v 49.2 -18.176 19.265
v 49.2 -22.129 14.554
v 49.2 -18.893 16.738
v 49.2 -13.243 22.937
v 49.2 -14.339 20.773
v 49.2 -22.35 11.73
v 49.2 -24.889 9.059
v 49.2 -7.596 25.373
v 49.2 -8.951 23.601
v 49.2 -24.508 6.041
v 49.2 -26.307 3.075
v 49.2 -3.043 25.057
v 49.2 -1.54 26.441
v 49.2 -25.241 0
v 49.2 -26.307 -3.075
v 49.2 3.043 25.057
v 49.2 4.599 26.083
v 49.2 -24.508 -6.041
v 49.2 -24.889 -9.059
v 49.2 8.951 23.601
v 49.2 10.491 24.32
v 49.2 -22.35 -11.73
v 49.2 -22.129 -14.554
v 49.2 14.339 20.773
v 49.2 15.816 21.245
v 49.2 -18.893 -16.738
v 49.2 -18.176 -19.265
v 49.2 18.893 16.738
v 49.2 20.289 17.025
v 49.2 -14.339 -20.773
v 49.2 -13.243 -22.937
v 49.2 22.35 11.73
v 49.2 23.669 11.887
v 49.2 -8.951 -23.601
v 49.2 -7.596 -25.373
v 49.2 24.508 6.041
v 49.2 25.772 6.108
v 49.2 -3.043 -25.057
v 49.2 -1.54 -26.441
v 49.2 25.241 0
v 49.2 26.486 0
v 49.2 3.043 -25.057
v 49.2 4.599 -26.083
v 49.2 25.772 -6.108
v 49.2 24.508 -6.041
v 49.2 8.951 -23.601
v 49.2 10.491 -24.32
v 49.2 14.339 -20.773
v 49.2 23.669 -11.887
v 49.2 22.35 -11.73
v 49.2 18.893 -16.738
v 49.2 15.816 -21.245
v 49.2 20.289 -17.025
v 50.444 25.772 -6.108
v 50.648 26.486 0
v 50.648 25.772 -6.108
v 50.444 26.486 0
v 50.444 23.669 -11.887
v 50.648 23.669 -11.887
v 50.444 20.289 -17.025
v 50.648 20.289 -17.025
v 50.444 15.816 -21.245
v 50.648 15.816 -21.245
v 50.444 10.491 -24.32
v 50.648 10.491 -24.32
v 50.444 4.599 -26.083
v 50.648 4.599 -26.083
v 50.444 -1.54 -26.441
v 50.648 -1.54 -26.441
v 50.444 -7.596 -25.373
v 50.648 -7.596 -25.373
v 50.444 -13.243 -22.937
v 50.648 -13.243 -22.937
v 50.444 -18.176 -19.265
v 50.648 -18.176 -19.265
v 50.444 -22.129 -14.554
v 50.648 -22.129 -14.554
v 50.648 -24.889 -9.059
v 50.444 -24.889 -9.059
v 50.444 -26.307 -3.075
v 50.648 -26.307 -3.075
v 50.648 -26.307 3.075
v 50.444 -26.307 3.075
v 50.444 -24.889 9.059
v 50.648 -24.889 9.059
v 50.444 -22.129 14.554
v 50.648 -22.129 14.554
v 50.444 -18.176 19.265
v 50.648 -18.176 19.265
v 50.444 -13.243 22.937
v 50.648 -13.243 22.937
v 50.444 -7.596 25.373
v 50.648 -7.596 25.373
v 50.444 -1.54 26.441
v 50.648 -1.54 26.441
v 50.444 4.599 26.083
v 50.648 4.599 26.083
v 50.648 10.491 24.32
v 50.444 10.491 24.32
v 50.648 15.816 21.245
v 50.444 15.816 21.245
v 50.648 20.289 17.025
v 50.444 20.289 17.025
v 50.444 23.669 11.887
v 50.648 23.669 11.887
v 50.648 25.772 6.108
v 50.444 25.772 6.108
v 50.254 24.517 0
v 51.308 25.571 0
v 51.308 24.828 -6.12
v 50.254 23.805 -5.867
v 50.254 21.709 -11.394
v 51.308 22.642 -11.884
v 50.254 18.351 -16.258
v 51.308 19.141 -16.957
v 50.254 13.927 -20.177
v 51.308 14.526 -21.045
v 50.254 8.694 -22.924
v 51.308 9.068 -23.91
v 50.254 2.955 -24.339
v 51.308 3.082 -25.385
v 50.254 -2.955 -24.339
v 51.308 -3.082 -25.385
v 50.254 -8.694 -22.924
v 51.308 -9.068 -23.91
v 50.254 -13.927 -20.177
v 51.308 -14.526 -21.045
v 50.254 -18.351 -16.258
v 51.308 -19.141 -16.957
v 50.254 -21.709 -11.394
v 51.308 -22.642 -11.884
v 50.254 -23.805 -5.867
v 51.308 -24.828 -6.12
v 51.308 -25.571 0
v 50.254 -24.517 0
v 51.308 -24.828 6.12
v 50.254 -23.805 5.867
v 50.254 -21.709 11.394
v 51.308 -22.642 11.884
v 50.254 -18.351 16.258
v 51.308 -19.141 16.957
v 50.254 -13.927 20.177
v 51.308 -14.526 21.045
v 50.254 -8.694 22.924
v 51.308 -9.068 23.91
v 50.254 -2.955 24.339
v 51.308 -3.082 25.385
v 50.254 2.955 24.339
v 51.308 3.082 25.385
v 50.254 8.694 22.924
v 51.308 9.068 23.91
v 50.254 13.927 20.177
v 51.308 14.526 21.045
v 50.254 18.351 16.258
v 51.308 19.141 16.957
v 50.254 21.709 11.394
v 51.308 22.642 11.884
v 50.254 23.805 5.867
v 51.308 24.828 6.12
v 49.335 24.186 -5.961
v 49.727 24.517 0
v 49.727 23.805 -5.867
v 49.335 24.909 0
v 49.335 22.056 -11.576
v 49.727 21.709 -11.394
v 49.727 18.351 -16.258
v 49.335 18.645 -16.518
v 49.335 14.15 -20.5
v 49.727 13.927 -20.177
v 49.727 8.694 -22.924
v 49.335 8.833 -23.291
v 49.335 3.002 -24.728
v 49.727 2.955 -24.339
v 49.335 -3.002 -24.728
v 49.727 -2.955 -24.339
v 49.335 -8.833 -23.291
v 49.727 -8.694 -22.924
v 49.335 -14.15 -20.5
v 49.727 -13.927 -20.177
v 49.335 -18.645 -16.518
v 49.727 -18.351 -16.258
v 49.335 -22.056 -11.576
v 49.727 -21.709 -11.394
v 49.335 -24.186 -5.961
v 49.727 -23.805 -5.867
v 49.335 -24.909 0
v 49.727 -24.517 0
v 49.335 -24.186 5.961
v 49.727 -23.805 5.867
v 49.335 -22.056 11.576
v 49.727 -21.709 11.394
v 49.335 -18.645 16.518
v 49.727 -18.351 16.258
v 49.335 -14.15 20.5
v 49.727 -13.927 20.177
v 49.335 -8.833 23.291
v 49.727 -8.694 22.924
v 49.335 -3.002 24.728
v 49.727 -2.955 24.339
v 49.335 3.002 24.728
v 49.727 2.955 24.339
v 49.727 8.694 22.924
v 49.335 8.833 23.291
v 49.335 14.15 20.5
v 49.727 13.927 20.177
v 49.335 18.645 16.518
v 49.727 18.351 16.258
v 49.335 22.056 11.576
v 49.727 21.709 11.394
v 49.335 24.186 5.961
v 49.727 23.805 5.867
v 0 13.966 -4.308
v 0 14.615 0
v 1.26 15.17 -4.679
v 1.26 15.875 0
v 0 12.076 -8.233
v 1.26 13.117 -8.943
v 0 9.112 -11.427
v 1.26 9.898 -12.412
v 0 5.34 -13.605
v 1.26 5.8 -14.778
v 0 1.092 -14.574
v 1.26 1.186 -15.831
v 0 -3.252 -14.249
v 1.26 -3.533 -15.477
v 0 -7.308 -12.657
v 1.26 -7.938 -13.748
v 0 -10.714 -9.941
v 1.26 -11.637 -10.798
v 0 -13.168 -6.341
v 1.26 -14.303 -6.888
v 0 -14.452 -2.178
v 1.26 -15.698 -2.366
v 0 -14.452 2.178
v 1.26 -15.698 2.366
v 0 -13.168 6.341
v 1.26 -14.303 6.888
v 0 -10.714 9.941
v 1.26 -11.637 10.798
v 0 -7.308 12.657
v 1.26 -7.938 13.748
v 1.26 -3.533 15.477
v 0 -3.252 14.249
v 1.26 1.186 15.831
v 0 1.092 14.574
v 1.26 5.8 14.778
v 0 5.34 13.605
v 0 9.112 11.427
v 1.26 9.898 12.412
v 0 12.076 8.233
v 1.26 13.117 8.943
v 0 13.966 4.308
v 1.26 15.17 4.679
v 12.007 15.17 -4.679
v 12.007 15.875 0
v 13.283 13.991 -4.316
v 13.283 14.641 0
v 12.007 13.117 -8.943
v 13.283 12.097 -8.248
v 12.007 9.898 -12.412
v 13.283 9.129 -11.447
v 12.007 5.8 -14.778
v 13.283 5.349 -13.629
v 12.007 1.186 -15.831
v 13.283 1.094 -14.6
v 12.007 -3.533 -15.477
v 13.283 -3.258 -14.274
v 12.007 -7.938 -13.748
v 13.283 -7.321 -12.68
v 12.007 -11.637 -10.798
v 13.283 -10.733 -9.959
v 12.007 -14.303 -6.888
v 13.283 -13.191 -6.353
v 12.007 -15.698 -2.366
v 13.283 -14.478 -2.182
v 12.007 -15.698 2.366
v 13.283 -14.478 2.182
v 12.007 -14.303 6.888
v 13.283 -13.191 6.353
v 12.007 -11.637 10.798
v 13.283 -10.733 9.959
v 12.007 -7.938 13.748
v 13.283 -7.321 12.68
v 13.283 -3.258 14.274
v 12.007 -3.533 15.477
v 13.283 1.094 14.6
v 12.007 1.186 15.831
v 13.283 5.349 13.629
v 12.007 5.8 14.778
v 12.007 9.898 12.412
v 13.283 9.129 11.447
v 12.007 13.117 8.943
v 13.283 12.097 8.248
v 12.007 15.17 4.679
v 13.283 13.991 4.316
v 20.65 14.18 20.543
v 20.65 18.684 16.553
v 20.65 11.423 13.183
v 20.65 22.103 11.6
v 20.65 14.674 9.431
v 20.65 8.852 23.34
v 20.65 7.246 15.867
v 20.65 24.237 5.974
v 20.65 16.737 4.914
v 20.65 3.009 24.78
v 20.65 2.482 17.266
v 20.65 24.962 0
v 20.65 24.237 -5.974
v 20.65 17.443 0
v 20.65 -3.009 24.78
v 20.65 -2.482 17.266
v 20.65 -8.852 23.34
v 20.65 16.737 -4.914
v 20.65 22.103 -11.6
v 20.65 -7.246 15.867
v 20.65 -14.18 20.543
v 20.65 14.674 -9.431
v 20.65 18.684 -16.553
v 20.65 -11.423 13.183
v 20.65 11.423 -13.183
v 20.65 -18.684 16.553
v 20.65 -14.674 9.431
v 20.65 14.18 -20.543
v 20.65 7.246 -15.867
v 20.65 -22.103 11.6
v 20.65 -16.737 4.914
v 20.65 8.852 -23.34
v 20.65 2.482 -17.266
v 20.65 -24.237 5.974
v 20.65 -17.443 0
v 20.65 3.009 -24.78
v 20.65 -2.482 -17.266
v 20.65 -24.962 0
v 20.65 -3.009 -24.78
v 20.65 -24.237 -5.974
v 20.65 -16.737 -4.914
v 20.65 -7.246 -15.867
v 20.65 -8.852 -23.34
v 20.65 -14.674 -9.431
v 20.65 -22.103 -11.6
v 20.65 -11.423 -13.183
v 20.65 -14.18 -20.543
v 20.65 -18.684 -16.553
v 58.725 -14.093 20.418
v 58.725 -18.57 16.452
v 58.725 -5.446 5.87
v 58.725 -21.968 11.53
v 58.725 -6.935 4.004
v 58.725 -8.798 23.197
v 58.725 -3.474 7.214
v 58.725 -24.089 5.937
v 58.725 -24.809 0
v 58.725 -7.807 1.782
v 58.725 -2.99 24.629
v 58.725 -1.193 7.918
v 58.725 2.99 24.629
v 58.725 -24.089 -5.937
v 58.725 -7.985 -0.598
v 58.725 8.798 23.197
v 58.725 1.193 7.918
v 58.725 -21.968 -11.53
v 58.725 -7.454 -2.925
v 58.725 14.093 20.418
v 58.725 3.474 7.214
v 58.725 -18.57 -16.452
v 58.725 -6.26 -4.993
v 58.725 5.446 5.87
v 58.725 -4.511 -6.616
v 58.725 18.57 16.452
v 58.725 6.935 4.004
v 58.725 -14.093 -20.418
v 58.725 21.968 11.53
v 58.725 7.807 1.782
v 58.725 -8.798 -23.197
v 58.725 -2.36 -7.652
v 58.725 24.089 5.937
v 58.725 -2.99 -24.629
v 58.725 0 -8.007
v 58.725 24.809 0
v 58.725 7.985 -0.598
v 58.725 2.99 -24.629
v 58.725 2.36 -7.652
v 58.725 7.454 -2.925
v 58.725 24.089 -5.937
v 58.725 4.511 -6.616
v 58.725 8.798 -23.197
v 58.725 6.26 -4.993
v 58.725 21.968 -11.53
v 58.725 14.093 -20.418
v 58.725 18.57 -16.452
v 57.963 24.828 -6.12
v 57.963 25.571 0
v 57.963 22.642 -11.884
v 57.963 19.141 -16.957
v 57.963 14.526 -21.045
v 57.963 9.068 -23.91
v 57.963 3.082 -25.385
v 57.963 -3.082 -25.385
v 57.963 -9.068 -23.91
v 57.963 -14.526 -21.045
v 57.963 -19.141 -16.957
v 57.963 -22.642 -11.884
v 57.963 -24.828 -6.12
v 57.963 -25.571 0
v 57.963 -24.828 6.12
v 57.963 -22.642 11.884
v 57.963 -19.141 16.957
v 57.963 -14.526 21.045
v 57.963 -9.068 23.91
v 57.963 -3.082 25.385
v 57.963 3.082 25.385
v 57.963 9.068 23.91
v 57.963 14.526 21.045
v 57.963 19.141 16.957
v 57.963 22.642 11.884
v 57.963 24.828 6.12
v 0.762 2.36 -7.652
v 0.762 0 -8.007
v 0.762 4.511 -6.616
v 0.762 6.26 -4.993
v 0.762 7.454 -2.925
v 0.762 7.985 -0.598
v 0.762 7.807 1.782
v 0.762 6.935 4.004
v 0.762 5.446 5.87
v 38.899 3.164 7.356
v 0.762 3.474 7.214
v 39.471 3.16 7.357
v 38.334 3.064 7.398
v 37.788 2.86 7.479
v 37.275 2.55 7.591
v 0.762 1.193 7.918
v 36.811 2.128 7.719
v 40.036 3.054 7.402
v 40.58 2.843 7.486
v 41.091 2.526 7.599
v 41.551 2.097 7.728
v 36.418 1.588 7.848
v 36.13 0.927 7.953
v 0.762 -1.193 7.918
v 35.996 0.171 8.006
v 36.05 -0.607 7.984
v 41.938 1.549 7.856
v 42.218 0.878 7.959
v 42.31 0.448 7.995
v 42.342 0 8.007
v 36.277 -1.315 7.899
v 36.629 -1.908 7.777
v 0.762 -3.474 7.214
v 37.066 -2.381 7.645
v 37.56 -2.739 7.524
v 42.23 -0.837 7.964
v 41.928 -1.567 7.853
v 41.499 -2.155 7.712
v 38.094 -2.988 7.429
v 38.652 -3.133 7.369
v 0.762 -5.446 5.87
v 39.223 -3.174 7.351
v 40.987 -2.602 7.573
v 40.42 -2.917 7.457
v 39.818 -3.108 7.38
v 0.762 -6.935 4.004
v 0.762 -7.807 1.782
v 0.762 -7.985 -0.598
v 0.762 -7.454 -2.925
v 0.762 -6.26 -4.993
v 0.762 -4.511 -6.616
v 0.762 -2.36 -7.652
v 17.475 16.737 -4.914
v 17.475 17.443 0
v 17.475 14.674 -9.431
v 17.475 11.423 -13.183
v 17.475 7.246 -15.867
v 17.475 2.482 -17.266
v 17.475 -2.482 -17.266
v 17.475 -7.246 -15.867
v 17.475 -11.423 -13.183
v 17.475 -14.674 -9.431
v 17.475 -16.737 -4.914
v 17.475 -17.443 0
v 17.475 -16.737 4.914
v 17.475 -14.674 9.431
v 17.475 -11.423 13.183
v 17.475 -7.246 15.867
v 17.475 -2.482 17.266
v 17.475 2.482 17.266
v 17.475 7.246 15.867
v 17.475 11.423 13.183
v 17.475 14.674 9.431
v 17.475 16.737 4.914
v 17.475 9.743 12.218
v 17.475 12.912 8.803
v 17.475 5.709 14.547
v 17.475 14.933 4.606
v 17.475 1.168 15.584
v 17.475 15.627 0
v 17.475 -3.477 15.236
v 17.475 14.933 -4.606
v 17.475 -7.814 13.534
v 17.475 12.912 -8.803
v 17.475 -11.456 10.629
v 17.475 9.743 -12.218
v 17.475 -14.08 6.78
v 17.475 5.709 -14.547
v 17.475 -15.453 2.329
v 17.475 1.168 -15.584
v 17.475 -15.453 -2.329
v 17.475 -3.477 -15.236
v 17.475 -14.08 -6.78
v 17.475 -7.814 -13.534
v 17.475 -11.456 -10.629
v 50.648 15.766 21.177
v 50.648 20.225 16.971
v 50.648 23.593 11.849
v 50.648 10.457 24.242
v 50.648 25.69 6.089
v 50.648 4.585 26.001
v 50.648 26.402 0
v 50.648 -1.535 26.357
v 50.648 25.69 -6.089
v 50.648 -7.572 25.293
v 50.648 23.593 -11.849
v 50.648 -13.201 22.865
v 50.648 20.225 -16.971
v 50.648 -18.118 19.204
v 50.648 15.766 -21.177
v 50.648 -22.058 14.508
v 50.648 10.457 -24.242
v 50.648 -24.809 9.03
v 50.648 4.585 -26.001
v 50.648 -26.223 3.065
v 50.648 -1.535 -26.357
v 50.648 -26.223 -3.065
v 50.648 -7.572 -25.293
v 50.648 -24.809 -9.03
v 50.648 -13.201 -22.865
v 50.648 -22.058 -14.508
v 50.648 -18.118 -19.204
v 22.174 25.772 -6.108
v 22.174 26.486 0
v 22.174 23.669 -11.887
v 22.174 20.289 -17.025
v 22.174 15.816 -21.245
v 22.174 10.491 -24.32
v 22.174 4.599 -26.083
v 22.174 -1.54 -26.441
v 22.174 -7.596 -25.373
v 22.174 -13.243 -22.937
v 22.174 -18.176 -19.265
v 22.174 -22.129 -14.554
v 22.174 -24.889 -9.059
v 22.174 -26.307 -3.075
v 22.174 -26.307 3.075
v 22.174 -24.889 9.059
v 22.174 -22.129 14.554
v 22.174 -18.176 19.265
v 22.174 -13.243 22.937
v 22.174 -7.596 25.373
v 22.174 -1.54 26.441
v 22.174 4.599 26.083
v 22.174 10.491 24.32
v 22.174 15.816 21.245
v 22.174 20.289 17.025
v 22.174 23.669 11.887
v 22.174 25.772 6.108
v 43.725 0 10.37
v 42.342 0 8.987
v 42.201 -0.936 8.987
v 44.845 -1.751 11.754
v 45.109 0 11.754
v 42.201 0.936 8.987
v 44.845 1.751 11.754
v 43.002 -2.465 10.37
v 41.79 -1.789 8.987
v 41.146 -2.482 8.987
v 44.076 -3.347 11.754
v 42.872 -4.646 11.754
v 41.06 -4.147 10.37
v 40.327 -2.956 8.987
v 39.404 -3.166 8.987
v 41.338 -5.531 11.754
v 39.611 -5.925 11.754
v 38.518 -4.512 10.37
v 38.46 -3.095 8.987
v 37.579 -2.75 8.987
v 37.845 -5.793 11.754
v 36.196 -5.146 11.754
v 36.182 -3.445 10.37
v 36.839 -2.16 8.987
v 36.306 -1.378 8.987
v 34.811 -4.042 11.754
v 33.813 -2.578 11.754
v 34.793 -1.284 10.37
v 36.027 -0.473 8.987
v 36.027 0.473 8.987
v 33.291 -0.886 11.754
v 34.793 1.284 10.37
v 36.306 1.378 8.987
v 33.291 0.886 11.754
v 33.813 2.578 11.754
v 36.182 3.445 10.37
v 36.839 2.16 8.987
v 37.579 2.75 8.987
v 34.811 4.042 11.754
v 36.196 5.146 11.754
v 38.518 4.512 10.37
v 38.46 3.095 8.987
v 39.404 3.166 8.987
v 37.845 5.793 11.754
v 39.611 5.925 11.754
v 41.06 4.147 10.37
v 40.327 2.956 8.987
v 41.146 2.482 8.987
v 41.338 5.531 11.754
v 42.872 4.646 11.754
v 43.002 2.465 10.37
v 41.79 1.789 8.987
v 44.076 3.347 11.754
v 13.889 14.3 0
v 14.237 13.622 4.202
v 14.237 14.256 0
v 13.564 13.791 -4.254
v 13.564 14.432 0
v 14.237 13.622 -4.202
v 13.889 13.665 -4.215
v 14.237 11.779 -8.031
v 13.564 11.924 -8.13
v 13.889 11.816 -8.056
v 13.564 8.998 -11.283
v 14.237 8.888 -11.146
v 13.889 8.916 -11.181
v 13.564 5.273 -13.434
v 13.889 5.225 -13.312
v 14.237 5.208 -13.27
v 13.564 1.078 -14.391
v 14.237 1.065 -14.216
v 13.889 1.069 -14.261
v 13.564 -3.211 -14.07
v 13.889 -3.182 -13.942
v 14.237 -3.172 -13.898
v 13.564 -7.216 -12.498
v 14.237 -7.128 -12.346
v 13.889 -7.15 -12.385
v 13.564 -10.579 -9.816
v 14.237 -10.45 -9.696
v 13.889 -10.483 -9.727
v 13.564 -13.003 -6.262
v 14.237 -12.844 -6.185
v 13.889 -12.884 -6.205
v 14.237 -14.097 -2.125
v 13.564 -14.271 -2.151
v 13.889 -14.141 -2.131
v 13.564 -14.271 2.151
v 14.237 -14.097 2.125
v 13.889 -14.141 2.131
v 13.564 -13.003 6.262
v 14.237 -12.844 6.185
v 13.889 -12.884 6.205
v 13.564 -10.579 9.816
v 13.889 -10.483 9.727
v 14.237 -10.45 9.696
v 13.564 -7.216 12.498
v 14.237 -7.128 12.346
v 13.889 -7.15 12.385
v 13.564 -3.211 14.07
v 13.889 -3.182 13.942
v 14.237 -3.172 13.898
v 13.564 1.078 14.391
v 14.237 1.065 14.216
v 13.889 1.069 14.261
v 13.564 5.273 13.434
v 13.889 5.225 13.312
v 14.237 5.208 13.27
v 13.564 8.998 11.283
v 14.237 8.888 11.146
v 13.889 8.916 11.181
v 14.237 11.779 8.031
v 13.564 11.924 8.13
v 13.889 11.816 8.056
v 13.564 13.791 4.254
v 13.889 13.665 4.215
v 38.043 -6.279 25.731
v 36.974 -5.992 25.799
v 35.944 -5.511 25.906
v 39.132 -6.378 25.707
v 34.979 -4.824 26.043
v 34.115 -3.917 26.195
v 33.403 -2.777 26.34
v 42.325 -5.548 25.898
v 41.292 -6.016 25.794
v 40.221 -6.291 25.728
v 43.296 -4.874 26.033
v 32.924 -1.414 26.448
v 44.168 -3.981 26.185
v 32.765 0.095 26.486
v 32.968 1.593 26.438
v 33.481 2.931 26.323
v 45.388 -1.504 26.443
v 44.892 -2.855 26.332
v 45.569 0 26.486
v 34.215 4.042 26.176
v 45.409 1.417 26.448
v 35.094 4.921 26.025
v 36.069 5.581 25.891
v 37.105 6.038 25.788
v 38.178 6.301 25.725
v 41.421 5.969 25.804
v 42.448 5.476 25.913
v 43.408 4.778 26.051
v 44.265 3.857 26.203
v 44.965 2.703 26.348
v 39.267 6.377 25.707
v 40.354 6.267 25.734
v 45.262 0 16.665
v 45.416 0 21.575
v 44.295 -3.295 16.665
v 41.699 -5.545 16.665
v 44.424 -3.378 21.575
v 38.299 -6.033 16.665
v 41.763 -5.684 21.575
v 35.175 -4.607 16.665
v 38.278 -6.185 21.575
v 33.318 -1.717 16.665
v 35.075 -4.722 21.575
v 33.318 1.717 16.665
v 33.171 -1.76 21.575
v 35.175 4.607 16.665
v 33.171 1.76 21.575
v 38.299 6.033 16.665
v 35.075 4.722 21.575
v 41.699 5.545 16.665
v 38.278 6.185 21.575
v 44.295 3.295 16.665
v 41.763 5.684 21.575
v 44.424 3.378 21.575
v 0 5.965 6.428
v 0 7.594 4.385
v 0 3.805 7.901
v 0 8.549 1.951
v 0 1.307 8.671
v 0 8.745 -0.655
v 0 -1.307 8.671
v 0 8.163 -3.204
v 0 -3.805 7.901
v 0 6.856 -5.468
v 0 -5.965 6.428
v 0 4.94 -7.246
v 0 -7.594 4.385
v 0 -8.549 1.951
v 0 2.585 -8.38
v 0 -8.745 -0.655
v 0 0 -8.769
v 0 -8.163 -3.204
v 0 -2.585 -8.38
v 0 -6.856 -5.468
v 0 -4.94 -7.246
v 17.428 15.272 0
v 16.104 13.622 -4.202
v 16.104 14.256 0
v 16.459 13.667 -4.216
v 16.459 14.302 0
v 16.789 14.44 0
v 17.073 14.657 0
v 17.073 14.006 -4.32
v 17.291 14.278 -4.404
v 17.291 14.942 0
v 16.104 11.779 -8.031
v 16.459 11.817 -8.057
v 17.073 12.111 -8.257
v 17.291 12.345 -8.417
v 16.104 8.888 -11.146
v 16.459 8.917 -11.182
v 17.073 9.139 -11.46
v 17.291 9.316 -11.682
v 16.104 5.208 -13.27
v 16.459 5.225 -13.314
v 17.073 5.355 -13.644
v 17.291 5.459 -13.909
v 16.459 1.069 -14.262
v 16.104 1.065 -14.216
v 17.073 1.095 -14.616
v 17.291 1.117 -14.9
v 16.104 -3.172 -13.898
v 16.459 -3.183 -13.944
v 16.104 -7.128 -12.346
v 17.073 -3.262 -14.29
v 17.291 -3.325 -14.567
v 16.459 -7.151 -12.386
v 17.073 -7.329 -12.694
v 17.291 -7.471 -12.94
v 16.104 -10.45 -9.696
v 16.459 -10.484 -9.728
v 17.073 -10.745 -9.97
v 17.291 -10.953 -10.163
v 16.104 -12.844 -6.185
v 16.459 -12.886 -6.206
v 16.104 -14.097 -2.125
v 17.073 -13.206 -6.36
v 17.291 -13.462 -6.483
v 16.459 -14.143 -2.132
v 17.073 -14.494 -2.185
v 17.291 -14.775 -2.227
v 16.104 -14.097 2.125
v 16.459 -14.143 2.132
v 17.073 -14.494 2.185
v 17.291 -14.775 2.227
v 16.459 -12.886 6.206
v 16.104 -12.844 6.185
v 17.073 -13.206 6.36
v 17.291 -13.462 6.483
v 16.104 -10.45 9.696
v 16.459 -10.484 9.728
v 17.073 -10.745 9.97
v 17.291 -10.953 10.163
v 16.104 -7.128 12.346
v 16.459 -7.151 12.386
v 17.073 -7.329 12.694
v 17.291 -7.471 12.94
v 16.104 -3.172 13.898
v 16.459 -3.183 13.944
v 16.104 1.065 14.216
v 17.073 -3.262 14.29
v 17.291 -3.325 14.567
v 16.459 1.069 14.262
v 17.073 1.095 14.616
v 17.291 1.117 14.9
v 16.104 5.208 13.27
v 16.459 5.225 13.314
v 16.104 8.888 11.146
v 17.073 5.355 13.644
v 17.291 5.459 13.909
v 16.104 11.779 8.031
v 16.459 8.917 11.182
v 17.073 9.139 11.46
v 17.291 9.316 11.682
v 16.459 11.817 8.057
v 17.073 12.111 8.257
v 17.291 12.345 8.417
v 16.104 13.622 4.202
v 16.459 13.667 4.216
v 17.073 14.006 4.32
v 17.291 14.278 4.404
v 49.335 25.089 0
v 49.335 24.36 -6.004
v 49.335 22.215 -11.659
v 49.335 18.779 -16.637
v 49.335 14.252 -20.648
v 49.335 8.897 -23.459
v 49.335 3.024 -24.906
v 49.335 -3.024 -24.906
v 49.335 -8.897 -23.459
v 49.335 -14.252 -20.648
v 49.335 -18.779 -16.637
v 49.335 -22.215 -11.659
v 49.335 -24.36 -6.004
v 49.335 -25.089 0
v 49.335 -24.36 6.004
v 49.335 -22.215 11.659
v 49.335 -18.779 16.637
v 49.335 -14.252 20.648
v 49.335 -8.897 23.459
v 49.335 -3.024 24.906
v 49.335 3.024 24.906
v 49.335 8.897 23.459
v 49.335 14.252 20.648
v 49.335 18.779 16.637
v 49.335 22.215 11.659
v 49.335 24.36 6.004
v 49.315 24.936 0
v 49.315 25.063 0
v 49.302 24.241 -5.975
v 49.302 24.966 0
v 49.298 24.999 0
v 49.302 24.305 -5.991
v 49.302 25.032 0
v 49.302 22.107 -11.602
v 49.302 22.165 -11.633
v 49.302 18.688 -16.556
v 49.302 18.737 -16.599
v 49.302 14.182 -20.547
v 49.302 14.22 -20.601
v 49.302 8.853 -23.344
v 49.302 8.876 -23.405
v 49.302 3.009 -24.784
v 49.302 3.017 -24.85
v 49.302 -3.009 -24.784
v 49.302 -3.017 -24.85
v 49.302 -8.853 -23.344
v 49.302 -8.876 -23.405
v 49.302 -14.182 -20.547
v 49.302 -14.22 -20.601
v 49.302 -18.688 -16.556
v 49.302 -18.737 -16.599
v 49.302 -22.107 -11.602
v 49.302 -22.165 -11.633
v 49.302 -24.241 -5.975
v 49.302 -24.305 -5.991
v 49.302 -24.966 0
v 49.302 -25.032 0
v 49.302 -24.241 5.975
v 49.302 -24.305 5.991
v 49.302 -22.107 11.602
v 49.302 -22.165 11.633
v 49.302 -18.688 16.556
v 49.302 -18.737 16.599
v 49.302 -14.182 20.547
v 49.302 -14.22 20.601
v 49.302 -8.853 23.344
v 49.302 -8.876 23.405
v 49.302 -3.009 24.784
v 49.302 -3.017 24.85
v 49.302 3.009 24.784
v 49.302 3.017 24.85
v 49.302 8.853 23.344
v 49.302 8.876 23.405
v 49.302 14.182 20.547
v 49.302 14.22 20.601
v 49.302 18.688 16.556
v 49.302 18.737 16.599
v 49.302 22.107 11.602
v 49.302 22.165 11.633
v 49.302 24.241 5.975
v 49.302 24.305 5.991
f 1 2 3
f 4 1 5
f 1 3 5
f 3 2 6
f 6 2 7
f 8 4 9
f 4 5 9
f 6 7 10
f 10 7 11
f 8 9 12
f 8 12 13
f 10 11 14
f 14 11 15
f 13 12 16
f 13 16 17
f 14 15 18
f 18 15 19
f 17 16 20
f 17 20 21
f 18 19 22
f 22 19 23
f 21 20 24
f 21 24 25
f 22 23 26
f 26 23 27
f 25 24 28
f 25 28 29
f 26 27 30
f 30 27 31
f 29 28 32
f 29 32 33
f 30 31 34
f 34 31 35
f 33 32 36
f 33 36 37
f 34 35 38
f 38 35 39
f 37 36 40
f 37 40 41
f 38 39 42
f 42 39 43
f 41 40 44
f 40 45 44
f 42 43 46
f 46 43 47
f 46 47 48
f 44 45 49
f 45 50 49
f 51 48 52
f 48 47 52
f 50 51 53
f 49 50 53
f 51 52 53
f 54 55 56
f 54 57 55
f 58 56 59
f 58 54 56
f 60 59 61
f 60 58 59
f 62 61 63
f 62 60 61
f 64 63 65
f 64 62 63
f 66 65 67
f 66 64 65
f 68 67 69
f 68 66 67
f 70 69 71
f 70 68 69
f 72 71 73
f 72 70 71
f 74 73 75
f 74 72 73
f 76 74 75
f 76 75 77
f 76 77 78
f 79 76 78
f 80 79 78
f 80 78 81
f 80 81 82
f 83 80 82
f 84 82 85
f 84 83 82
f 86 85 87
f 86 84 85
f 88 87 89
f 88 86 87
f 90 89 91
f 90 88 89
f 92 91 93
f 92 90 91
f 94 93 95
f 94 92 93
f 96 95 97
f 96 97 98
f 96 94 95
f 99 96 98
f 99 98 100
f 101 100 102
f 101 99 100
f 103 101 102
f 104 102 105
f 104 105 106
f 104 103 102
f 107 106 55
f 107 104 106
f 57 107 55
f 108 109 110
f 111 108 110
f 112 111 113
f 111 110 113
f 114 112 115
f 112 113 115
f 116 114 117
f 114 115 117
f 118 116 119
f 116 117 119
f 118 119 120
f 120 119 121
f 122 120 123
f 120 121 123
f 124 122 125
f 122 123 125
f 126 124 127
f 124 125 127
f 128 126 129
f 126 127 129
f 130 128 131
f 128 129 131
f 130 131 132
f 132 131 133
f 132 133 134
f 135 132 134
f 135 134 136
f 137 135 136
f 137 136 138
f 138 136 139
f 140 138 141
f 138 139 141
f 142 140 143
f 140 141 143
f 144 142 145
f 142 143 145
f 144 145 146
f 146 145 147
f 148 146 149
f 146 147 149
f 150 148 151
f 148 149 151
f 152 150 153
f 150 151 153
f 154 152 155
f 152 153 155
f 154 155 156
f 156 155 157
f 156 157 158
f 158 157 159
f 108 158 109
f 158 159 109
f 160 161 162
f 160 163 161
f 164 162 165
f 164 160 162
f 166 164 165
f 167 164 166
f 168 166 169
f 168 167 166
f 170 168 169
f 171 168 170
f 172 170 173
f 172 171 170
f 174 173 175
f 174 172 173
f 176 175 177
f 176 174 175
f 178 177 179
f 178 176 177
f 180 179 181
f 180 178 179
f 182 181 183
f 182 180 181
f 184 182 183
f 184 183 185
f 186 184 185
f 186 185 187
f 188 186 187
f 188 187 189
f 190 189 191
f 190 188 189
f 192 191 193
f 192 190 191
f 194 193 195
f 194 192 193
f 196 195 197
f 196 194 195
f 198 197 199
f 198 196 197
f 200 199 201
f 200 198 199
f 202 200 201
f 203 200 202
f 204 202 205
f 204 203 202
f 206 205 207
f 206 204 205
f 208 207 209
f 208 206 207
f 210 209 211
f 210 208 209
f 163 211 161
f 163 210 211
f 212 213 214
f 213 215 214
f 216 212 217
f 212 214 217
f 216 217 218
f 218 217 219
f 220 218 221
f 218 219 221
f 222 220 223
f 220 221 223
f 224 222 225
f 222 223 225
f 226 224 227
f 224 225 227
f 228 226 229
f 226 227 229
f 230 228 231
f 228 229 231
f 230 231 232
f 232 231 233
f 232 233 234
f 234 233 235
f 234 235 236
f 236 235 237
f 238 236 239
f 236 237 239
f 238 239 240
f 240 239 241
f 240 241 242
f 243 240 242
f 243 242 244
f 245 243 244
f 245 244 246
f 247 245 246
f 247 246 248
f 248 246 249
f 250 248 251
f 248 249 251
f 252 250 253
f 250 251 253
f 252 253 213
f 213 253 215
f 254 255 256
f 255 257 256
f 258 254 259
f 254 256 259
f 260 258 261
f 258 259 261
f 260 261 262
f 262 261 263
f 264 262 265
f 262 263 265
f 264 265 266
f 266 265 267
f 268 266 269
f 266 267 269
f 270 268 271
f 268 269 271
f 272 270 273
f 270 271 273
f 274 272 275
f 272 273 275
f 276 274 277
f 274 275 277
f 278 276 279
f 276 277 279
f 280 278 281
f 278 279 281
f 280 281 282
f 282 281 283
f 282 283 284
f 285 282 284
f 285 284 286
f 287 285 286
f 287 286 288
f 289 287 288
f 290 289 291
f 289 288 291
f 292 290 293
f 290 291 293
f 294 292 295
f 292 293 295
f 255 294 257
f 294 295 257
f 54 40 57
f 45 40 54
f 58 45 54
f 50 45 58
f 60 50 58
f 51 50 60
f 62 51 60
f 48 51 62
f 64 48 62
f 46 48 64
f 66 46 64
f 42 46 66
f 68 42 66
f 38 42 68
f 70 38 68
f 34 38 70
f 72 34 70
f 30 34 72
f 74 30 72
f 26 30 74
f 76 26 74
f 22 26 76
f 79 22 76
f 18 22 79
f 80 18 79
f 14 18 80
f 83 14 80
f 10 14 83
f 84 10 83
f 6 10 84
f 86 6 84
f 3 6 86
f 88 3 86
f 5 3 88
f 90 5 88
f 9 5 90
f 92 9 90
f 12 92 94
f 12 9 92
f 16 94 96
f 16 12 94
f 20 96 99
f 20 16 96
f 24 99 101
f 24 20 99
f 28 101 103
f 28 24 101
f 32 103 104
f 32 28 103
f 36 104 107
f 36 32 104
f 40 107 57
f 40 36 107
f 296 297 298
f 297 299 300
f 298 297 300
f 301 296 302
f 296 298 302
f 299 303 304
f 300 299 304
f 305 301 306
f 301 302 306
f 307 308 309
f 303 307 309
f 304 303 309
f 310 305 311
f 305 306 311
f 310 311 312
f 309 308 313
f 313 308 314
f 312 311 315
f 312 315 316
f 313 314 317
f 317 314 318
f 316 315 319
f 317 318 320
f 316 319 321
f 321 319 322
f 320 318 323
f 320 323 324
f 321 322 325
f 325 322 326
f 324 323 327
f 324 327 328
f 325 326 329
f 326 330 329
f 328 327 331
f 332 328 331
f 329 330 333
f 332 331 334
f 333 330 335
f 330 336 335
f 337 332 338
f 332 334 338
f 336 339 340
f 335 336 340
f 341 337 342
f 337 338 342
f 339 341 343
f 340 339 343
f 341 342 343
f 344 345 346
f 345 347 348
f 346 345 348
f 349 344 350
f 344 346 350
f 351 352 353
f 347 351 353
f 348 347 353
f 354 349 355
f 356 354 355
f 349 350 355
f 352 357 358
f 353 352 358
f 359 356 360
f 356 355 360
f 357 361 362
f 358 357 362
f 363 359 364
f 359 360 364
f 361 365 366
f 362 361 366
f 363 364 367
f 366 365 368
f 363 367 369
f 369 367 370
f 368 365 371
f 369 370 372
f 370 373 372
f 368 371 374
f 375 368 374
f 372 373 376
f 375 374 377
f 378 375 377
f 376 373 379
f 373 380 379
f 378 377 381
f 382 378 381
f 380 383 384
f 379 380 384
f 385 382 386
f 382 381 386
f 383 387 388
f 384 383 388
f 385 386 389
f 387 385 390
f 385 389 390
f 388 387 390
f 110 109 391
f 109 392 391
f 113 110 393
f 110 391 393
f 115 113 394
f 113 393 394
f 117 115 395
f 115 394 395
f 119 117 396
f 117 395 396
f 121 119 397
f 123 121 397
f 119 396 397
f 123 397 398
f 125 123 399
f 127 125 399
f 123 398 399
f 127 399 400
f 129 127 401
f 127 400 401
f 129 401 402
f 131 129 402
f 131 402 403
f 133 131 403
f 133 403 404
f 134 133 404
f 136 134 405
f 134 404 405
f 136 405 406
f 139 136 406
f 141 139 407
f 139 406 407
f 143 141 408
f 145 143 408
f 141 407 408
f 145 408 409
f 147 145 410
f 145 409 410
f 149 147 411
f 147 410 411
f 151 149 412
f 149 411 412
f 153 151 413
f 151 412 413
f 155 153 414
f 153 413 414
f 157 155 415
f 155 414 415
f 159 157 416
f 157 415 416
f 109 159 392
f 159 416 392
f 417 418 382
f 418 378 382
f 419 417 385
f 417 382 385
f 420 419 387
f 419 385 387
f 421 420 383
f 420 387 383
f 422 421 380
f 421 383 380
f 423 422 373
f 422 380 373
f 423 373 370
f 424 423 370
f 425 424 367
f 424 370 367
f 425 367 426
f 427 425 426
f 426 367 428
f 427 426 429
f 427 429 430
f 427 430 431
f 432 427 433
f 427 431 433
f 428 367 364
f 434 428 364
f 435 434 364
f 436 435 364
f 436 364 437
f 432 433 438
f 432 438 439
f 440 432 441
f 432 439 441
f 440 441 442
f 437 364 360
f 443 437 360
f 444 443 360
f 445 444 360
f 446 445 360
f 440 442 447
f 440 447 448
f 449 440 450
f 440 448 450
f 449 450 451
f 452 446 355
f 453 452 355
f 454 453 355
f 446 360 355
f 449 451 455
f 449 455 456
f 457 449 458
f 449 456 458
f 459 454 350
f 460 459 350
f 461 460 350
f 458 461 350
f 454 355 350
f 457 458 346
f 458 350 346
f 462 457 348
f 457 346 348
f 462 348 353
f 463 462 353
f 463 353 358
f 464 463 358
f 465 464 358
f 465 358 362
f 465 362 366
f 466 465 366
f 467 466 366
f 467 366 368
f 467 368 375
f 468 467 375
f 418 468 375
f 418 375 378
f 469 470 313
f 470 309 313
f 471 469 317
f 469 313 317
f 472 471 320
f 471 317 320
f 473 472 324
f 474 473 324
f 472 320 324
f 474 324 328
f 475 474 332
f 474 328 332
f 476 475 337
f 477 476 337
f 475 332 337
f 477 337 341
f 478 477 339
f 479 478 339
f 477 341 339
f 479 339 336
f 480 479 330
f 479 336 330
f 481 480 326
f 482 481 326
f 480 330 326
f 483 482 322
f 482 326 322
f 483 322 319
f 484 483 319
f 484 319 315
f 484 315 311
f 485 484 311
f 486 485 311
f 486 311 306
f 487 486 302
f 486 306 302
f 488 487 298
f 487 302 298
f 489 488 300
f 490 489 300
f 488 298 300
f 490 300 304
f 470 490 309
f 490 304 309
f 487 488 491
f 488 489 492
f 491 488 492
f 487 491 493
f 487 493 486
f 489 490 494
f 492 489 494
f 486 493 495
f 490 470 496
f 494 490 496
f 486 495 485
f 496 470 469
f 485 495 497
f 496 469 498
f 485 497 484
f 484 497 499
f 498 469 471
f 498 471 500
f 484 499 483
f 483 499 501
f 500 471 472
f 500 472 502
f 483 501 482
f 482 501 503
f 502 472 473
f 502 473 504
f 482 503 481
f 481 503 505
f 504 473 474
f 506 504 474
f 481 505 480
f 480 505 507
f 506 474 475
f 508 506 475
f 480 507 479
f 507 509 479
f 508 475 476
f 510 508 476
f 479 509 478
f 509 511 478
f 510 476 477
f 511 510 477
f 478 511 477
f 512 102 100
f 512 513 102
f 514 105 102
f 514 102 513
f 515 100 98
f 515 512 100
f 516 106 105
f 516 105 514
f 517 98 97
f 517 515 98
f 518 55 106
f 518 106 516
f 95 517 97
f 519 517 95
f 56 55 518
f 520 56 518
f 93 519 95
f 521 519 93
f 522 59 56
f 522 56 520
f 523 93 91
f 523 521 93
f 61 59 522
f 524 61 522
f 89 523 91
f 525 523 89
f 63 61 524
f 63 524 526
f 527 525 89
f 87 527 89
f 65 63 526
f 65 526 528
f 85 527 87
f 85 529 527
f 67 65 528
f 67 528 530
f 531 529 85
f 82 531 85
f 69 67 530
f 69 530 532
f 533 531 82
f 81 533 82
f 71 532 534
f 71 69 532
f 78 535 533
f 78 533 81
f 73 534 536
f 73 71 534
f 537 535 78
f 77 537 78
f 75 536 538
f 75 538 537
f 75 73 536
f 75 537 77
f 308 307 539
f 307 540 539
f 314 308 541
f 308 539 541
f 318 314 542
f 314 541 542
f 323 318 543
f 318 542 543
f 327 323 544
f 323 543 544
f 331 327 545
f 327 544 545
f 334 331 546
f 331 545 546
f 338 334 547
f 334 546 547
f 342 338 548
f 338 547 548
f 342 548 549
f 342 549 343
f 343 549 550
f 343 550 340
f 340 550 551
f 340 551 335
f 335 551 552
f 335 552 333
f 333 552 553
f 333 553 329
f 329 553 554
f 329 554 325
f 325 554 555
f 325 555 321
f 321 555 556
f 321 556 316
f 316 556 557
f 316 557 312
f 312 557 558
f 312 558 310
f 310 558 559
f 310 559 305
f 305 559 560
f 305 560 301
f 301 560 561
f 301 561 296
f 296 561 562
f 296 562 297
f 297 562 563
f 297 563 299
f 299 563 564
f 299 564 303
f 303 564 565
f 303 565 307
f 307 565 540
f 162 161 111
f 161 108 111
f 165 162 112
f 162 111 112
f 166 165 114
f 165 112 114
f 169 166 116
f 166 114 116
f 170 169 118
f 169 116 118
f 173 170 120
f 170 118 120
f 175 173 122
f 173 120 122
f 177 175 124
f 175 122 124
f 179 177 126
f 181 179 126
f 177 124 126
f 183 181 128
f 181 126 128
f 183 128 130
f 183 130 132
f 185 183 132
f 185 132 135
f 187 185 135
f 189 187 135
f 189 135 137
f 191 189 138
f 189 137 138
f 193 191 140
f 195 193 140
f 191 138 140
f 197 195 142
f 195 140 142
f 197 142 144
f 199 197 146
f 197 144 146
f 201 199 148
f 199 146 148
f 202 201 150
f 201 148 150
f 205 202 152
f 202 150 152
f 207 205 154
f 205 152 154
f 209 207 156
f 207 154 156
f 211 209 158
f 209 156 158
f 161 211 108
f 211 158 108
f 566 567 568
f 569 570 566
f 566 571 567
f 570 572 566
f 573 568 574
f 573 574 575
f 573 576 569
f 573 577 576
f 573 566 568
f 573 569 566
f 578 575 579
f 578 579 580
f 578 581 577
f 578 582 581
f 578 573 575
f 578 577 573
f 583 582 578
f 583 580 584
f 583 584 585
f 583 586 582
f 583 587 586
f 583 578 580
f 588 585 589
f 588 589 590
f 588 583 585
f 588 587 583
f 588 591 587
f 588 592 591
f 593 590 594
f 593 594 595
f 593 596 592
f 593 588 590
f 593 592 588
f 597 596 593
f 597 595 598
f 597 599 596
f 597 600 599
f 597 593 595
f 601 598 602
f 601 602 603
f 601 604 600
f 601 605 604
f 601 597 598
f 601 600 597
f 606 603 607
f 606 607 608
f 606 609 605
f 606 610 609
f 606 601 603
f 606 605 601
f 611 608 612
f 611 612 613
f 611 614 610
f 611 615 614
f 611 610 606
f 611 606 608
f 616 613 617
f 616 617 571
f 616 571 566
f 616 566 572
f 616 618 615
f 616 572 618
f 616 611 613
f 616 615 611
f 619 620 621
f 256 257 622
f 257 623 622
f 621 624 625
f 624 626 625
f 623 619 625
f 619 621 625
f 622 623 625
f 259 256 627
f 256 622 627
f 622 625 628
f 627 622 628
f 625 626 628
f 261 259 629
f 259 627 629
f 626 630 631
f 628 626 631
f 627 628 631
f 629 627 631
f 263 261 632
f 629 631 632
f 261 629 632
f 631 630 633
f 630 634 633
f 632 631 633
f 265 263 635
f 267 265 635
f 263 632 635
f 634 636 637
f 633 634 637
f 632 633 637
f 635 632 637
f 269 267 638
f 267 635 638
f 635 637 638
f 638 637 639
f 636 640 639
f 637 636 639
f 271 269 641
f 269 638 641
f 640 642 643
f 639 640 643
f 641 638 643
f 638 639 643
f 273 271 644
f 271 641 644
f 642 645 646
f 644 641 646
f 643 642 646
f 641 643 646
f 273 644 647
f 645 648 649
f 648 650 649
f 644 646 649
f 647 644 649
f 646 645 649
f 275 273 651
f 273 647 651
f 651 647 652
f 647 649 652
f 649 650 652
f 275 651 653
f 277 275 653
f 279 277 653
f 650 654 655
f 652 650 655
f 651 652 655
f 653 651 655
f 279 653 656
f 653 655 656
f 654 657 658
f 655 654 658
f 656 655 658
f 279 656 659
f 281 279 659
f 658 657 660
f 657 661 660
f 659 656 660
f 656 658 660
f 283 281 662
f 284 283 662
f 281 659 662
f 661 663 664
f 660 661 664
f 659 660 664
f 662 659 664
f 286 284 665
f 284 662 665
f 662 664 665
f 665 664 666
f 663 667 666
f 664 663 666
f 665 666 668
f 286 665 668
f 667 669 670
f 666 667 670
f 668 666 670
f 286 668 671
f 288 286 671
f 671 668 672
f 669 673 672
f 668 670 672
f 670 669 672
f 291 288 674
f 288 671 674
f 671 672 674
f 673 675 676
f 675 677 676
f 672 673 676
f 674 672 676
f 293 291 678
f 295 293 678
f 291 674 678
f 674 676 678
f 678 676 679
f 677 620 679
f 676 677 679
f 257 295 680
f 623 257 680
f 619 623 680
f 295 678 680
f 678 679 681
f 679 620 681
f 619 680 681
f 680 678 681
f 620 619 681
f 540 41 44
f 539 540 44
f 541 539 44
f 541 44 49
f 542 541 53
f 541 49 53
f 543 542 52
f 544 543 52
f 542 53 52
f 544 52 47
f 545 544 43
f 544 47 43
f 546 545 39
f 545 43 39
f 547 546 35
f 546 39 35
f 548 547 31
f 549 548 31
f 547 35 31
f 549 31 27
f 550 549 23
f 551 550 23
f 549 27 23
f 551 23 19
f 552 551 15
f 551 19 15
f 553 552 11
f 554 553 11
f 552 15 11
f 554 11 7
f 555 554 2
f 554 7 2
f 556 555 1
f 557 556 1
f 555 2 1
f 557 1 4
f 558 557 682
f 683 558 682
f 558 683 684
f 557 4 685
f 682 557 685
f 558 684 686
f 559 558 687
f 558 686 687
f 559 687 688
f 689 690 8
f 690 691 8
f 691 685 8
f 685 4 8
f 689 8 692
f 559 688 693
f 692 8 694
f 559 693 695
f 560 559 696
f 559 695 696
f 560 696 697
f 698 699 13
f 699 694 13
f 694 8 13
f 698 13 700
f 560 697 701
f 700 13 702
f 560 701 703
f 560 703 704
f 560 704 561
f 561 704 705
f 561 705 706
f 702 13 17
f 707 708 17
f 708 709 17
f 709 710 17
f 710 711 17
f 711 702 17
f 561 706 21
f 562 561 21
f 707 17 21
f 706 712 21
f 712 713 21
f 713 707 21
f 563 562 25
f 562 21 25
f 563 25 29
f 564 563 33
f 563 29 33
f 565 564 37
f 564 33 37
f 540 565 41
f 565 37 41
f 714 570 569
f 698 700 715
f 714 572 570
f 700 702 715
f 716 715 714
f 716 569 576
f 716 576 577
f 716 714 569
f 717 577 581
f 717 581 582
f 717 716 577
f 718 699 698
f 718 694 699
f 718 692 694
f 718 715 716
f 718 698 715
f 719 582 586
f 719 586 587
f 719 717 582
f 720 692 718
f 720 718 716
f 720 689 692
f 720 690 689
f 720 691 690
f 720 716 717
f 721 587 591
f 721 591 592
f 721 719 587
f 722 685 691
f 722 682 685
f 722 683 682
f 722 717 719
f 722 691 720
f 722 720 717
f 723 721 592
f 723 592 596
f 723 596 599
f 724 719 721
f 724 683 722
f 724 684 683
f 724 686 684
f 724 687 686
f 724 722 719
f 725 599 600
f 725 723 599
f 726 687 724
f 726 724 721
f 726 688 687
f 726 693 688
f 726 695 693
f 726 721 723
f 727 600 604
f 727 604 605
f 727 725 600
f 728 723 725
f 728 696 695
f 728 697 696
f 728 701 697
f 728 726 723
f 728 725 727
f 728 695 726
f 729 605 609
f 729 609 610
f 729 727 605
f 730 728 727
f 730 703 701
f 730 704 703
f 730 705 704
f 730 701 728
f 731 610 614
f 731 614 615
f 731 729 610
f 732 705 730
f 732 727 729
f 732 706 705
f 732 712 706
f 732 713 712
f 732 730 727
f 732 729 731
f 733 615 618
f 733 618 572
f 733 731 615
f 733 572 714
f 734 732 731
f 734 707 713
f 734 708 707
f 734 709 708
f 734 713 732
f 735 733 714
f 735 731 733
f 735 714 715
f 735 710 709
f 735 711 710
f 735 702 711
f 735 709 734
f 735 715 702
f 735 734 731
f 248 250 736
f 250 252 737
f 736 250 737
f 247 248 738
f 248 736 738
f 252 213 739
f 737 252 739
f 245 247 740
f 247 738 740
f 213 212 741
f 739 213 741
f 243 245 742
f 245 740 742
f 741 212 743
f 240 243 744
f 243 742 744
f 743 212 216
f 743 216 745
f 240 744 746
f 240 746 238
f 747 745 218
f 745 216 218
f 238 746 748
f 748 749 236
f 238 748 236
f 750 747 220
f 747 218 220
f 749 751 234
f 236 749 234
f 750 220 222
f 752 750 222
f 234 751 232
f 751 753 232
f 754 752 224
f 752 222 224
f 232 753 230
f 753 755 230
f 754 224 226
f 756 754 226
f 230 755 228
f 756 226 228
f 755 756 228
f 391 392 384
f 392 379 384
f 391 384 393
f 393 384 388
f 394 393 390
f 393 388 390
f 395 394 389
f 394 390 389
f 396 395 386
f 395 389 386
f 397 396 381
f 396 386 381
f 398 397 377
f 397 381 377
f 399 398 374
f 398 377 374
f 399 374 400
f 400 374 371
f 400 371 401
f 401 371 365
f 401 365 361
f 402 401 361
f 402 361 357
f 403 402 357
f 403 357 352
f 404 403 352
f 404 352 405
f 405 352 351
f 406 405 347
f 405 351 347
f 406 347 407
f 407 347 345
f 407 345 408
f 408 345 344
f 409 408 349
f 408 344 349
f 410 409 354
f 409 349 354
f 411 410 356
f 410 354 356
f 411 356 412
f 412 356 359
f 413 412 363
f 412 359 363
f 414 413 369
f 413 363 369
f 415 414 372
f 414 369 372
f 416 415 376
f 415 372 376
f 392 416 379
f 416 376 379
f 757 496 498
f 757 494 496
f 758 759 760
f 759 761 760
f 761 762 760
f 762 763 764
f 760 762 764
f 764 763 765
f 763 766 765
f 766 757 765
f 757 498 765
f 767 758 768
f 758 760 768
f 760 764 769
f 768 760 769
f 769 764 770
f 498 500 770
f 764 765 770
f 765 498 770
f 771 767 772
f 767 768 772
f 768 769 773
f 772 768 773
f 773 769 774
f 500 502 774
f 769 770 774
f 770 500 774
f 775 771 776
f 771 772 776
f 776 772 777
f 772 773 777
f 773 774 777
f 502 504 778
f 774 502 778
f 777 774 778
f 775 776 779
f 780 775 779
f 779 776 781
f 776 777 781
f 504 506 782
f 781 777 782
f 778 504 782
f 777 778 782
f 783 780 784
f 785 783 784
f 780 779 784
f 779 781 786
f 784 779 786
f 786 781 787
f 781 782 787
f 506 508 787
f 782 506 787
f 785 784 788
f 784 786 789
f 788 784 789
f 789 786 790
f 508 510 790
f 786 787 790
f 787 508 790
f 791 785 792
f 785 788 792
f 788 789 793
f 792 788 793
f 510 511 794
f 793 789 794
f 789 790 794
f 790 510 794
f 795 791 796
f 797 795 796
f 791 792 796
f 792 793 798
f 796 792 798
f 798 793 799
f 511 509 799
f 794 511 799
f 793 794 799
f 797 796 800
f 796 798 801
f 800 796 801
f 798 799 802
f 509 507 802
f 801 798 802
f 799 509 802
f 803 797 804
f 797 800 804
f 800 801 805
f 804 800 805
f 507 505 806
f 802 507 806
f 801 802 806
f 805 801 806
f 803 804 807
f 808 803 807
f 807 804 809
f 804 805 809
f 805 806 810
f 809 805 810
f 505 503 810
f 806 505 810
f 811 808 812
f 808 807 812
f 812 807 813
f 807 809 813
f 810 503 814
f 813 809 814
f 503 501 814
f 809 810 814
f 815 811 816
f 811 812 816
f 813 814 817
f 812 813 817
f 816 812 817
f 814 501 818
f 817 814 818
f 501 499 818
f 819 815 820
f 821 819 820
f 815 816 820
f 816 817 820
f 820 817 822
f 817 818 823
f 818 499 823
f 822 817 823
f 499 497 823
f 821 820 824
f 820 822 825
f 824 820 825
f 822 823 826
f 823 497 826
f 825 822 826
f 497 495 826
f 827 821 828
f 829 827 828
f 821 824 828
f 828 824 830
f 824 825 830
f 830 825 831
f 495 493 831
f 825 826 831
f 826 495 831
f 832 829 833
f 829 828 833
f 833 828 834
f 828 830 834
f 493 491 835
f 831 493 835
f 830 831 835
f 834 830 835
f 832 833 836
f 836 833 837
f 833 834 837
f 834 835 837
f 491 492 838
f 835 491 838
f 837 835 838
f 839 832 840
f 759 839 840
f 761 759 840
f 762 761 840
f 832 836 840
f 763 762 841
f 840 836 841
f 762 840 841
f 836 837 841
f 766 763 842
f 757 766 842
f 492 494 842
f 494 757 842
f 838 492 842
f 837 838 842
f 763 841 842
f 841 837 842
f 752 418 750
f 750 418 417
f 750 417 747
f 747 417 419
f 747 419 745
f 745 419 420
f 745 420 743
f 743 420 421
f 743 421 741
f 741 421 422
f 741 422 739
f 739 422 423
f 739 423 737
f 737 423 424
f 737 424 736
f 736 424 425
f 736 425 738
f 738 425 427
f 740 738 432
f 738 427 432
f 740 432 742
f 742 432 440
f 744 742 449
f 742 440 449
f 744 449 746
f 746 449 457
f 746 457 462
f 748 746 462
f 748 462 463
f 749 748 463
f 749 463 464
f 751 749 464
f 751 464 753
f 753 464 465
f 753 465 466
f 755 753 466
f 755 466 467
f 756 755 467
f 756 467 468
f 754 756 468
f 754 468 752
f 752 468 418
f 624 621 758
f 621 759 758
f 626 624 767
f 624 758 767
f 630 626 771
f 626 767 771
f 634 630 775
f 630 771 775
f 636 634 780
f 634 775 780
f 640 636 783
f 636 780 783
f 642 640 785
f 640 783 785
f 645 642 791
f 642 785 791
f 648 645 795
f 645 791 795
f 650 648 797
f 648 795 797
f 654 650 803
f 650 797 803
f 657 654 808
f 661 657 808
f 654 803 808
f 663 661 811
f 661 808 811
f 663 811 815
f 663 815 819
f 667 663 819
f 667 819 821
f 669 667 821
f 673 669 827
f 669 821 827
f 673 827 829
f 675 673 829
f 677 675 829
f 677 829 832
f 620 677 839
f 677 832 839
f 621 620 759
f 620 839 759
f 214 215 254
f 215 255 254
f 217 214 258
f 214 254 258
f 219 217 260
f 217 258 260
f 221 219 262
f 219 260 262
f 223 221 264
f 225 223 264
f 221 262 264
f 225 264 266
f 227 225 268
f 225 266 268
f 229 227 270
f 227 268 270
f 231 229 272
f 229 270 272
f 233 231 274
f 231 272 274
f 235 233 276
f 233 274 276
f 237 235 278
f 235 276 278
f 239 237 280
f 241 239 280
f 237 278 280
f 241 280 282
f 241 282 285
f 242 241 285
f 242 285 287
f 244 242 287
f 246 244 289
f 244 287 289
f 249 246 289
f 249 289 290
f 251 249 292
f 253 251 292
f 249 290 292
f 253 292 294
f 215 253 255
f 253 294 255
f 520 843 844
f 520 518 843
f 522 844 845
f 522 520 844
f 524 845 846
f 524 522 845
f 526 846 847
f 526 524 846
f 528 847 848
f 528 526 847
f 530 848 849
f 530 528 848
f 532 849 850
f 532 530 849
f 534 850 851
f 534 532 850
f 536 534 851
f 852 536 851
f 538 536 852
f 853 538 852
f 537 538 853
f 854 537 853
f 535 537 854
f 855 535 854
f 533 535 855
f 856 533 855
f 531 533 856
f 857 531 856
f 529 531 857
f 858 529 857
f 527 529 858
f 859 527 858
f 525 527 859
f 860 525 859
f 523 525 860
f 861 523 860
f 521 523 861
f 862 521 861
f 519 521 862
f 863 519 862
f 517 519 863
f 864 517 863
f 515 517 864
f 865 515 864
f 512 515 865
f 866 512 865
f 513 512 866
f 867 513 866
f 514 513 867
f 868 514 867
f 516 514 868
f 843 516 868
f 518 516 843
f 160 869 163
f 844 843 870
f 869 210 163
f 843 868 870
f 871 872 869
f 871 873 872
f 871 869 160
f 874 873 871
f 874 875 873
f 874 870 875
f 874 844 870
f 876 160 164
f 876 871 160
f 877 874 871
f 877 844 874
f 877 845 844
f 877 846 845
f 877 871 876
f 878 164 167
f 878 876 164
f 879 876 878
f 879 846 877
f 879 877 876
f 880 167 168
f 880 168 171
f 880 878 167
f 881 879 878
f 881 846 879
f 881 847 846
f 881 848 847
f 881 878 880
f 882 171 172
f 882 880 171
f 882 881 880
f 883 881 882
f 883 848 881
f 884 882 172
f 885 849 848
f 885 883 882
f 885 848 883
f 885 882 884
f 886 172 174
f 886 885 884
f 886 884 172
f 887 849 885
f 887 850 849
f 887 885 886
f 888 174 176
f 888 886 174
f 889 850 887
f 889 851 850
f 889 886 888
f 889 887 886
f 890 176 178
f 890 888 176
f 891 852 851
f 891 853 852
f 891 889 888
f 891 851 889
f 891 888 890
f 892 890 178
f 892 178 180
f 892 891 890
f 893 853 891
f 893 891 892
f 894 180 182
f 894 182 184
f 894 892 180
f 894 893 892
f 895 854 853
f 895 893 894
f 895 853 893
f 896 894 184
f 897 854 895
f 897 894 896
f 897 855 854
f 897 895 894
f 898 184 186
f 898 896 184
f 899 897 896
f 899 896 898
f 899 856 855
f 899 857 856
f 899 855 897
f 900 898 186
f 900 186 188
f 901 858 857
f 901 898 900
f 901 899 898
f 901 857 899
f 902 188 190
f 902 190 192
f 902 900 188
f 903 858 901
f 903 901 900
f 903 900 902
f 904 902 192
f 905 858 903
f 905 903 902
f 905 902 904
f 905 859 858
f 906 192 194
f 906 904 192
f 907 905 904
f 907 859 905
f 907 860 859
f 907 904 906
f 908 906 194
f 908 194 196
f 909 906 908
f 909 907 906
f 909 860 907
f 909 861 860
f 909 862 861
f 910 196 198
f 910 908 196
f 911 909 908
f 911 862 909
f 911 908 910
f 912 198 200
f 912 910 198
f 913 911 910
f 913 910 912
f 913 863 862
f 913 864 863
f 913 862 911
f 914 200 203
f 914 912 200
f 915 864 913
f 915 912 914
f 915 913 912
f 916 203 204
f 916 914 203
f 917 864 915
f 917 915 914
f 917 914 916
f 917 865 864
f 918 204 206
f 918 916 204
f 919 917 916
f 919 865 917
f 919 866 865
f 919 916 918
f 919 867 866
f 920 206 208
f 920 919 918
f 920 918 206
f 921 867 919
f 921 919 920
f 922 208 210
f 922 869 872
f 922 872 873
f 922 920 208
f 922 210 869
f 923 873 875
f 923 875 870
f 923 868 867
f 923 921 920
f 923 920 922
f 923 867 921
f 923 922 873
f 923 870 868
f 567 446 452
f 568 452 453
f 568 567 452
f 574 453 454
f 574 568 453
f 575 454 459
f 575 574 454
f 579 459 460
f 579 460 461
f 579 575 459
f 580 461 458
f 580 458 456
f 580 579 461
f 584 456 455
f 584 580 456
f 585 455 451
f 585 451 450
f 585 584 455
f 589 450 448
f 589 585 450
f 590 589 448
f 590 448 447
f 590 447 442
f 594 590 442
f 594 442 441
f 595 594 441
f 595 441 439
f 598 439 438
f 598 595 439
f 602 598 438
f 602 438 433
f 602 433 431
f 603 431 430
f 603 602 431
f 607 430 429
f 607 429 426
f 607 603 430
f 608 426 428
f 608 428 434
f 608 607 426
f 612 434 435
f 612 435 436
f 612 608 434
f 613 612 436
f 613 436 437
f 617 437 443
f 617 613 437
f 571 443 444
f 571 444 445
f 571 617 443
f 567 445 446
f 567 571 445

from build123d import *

# Parameters (mm, degrees)
HOLE1_D           = 16.0147
HOLE1_CSINK_D     = 17.5387
HOLE1_CSINK_ANGLE = 90


with BuildPart() as part:
    # Sketch1 → Revolve1 (revolve)
    with BuildSketch(Plane.XY):
        with BuildLine():
            Line((0, 0), (0, 14.61516))
            Line((0, 14.61516), (1.25984, 15.875))
            Line((1.25984, 15.875), (12.006992339, 15.875))
            Line((12.006992339, 15.875), (13.283429147, 14.641164804))
            ThreePointArc((13.283429147, 14.641164804), (13.72258185, 14.355749006), (14.2367, 14.25575))
            Line((14.2367, 14.25575), (16.1036, 14.25575))
            ThreePointArc((16.1036, 14.25575), (17.073467661, 14.657482339), (17.4752, 15.62735))
            Line((17.4752, 15.62735), (17.4752, 17.44345))
            Line((17.4752, 17.44345), (20.6502, 17.44345))
            Line((20.6502, 17.44345), (20.6502, 0))
            Line((20.6502, 0), (0, 0))
        make_face()
    revolve(axis=Axis((20.6502, 0, 0), (-1, 0, 0)))

    # Sketch2 → Revolve2 (revolve)
    with BuildSketch(Plane.XY):
        Polygon((20.6502, 0), (20.6502, 24.96185), (22.1742, 26.48585), (49.1998, 26.48585), (49.1998, 24.51735), (50.2539, 24.51735), (51.308, 25.57145), (57.9628, 25.57145), (58.7248, 24.80945), (58.7248, 0), align=None)
    revolve(axis=Axis((58.7248, 0, 0), (-1, 0, 0)))

    # Hole1 (through all)
    with Locations(Plane.ZY):
        with Locations((0, 0)):
            CounterSinkHole(HOLE1_D / 2, HOLE1_CSINK_D / 2, counter_sink_angle=HOLE1_CSINK_ANGLE)

    # Sketch5 → Cut-Revolve1 (revolve, cut)
    with BuildSketch(Plane(origin=(0, 0, 0), x_dir=(1, 0, 0), z_dir=(0, 1, 0))):
        Polygon((39.1668, 0), (42.3418, 0), (42.3418, -8.986753545), (45.108896455, -11.75385), (45.568822746, -26.48585), (39.1668, -26.48585), align=None)
    revolve(axis=Axis((39.1668, 0, 26.48585), (0, 0, -1)), mode=Mode.SUBTRACT)

    # Sketch6 → Revolve3 (revolve)
    with BuildSketch(Plane.XY):
        with BuildLine():
            Line((49.1998, 24.26335), (50.2539, 24.26335))
            Line((50.2539, 24.26335), (50.2539, 24.51735))
            Line((50.2539, 24.51735), (49.72685, 24.51735))
            Line((49.72685, 24.51735), (49.334816303, 24.909383697))
            ThreePointArc((49.334816303, 24.909383697), (49.297618864, 24.999186258), (49.334816303, 25.088988819))
            Line((49.334816303, 25.088988819), (50.647509288, 26.401681804))
            Line((50.647509288, 26.401681804), (50.647509288, 26.48585))
            Line((50.647509288, 26.48585), (50.444309288, 26.48585))
            Line((50.444309288, 26.48585), (49.1998, 25.241340712))
            Line((49.1998, 25.241340712), (49.1998, 24.26335))
        make_face()
    revolve(axis=Axis((50.2539, 0, 0), (-1, 0, 0)))


solid = part.part
